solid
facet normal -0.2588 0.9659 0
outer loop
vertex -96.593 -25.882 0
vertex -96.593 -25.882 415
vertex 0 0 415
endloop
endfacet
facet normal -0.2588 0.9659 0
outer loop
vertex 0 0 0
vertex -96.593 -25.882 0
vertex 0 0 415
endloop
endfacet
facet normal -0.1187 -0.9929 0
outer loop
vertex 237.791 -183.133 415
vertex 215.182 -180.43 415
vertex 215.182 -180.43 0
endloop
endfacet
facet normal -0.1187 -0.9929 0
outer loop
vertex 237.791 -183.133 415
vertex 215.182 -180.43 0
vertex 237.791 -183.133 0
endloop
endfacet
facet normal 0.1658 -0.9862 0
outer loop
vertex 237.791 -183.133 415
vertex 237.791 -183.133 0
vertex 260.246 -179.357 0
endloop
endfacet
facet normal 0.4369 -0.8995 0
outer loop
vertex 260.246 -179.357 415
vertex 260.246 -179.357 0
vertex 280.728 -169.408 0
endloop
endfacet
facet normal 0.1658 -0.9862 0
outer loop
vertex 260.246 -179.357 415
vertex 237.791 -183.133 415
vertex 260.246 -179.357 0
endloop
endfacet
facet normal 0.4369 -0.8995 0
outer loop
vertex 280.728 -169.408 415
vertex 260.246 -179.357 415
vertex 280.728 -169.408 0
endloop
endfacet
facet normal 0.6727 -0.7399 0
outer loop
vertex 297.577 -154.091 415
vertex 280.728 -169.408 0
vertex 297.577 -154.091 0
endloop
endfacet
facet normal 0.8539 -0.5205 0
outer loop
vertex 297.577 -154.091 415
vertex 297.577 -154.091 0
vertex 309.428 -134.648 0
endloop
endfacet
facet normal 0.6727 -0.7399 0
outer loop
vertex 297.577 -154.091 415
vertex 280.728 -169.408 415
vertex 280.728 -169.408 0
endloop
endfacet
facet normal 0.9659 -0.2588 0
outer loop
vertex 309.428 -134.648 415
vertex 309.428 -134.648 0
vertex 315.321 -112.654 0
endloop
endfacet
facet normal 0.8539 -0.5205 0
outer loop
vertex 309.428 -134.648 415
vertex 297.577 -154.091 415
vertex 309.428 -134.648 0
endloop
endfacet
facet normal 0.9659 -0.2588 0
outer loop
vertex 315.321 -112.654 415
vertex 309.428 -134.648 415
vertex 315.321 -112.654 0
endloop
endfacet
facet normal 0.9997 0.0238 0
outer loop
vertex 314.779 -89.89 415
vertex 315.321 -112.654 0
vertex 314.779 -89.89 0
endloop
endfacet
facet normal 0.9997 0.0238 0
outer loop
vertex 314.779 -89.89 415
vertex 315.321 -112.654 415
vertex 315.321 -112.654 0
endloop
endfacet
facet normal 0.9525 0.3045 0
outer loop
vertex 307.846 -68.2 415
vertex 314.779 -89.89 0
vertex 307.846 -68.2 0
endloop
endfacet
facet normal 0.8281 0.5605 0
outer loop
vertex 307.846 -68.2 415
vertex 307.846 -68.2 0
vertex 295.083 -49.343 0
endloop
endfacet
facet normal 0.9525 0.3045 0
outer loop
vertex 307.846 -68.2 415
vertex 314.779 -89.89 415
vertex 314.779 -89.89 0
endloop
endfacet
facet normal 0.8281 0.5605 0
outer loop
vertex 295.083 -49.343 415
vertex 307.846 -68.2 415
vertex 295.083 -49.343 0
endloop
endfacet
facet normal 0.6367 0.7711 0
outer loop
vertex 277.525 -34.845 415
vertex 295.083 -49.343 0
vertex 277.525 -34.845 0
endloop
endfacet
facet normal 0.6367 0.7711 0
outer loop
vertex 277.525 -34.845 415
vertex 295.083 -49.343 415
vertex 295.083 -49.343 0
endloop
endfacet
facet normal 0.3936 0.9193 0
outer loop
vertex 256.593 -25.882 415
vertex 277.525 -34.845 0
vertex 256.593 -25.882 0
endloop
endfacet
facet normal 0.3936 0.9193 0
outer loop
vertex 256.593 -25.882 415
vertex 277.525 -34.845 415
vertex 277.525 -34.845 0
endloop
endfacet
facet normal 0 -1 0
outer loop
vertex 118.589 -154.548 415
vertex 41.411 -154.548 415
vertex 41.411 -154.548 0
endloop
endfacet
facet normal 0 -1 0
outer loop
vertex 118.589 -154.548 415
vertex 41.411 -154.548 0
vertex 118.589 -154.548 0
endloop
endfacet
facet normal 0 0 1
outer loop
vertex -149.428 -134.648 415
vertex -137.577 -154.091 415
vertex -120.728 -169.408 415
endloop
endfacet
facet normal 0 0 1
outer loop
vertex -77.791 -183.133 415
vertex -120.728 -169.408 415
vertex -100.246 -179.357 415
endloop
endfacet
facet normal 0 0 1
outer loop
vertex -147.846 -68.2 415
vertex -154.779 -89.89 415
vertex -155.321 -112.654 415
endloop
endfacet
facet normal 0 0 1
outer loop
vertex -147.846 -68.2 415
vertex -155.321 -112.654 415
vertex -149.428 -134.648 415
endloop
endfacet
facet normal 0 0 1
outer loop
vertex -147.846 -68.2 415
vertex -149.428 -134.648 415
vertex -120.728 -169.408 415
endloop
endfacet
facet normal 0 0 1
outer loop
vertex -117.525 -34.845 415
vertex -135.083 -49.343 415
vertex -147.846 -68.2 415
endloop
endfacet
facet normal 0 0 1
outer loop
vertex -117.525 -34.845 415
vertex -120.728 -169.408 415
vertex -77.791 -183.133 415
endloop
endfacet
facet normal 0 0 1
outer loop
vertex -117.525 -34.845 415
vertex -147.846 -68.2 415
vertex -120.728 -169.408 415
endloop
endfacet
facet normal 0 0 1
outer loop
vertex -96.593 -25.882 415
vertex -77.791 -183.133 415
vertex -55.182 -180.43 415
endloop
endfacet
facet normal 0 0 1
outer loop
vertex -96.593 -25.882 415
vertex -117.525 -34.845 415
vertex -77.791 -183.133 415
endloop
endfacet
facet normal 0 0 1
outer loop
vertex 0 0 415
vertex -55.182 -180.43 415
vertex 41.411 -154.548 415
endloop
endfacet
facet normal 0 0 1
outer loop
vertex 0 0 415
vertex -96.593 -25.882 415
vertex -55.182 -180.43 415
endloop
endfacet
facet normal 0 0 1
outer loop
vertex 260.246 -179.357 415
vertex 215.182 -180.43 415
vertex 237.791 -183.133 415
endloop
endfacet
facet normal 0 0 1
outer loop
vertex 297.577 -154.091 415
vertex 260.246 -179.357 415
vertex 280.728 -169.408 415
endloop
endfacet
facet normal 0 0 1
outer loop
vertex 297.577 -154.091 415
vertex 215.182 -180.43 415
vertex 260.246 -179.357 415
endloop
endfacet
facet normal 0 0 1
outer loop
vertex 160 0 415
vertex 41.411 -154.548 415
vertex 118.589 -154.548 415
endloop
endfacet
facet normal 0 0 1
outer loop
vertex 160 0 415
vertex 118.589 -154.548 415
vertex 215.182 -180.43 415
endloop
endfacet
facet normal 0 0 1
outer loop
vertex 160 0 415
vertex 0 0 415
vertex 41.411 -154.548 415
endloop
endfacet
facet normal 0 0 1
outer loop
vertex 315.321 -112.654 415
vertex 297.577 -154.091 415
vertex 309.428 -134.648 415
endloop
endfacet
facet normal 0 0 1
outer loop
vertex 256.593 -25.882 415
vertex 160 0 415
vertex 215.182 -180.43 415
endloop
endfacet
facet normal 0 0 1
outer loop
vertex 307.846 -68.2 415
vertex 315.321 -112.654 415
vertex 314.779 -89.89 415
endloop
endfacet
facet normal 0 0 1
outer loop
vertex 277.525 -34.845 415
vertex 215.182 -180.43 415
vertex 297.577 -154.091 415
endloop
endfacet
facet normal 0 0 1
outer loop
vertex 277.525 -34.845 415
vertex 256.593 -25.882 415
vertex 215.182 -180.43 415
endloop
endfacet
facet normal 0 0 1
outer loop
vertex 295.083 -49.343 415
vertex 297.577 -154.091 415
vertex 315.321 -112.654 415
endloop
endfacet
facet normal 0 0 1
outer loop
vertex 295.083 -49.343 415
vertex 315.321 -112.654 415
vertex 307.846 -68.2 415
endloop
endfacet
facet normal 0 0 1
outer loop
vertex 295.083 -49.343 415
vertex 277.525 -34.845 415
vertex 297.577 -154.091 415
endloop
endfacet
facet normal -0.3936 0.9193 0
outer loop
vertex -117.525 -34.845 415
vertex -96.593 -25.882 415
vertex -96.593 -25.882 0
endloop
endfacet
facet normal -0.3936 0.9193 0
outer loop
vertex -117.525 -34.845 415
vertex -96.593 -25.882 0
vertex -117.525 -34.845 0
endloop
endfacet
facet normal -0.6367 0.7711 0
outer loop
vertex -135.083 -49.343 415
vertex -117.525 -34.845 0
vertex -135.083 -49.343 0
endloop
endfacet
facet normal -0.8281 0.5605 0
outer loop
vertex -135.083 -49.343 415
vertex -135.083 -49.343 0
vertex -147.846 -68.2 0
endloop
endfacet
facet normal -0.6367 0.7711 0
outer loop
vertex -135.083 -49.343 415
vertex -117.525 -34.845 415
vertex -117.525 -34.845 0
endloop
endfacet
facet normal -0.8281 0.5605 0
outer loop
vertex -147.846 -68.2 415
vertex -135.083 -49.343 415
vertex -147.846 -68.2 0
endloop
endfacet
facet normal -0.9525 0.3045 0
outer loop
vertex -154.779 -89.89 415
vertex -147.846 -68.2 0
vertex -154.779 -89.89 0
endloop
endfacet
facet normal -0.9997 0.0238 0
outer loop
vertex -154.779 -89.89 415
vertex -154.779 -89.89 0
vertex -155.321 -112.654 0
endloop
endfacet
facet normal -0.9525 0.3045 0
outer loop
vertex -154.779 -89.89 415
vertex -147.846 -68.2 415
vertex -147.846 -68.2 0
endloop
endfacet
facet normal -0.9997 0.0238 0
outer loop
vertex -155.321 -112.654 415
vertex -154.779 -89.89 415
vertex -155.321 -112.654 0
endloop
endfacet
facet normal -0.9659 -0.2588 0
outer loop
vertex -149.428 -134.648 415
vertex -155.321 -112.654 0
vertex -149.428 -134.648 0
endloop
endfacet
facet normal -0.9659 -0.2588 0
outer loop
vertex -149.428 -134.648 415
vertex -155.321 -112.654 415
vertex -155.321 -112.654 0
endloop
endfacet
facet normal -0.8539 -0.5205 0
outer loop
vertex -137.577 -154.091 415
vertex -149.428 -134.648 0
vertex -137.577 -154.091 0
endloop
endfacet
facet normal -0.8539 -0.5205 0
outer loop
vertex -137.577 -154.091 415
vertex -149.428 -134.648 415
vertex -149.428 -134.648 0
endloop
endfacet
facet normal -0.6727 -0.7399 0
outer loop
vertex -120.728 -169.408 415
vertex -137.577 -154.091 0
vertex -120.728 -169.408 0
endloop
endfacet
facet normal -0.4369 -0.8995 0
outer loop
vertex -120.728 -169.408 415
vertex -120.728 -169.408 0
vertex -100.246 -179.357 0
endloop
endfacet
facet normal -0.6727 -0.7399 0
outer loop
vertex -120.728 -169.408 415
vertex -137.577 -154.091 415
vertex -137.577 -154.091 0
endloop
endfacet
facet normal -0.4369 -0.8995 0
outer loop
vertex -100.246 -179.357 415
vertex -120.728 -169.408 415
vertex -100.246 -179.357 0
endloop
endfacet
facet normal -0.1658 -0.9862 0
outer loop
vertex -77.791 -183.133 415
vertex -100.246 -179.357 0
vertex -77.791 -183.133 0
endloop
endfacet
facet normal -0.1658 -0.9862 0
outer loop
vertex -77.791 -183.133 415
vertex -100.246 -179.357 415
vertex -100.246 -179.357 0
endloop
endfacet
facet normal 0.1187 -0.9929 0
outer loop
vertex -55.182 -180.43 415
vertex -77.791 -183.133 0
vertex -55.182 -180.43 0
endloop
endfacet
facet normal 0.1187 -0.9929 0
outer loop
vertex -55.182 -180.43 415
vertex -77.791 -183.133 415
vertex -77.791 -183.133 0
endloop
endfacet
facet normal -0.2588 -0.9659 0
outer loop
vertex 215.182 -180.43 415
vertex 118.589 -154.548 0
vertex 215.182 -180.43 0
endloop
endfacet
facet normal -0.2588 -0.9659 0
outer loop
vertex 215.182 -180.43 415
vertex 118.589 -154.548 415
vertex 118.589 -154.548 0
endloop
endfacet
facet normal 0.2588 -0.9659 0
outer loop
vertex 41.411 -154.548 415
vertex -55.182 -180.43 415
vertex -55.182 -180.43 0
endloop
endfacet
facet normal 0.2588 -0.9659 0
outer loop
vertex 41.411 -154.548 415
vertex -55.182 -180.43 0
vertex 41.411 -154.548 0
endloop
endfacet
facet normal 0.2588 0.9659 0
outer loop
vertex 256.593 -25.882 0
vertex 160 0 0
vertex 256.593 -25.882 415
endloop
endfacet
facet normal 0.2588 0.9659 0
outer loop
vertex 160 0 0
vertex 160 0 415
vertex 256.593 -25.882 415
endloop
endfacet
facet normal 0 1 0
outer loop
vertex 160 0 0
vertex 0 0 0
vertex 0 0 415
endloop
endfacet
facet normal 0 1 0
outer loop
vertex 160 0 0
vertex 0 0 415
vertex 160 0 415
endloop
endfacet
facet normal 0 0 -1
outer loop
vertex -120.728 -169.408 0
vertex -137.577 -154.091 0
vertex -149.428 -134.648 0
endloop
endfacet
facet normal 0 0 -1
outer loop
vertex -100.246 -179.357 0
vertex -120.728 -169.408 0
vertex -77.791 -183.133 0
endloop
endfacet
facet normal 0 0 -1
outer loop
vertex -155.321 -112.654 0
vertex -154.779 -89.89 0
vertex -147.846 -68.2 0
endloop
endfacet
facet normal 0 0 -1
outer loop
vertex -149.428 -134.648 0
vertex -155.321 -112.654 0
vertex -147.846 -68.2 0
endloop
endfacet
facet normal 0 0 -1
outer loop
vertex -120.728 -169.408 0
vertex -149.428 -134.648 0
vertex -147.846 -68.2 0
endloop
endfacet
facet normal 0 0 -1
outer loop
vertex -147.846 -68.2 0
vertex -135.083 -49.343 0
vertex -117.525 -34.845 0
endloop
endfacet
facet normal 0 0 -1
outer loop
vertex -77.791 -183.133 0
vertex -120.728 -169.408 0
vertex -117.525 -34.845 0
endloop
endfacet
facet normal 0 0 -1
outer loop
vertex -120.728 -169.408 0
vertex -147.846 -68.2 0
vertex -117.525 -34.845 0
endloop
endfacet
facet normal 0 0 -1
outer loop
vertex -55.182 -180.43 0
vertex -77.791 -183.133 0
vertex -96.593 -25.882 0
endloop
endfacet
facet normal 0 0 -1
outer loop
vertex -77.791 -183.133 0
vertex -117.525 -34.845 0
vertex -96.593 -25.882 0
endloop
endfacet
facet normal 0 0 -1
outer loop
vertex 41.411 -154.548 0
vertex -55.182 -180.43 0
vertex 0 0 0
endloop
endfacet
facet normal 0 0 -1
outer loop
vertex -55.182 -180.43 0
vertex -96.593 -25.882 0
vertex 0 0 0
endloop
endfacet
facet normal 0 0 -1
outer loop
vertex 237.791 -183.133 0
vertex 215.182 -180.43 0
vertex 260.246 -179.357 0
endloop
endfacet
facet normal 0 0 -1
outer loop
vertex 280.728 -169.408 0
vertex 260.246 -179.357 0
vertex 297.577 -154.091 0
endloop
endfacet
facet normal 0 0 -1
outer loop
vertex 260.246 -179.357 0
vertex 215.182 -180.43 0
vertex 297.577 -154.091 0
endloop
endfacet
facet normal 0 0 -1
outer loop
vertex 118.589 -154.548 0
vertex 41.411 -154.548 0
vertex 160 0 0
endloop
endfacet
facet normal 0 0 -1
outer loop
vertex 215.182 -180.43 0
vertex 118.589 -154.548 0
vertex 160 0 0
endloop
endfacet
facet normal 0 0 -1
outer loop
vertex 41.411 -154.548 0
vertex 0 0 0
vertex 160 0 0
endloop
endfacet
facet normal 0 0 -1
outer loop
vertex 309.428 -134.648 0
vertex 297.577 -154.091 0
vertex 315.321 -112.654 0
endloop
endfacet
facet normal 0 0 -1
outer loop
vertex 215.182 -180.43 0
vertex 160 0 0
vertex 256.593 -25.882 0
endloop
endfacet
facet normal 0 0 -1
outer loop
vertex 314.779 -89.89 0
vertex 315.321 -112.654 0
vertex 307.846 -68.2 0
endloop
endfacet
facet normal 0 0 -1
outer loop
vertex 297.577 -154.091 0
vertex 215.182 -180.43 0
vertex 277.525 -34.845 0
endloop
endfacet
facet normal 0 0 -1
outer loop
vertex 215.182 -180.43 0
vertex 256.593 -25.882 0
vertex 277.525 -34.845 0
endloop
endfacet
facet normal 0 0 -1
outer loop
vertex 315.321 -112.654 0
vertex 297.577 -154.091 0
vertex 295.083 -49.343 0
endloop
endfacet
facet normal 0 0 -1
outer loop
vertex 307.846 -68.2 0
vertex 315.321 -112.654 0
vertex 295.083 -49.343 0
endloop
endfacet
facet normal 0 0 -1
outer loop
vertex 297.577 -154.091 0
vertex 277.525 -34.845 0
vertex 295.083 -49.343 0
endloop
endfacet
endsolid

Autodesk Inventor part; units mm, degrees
ref_plane "YZ Plane" through (0, 0, 0) normal (1, 0, 0) x (0, 1, 0)
ref_plane "XZ Plane" through (0, 0, 0) normal (0, 1, 0) x (-1, 0, 0)
ref_plane "XY Plane" through (0, 0, 0) normal (0, 0, 1) x (1, 0, 0)
sketch "Sketch1" plane through (0, 0, 0) normal (0, 0, 1) x (1, 0, 0)
  line L0 (0, 0) -> (160, 0)
  line L1 (160, 0) -> (118.589, -154.5481)
  line L2 (0, 0) -> (41.411, -154.5481)
  line L3 (41.411, -154.5481) -> (118.589, -154.5481)
  dimension "d4" = 160
  dimension "d5" = 160
  dimension "d6" = 160
  dimension "d7" = 75
extrude "Extrusion1" add sketch "Sketch1" along normal blind 415
sketch "Sketch2" plane through (0, 0, 415) normal (0, 0, 1) x (1, 0, 0)
  circle A0 centre (235.8871, -103.156) radius 80 construction
  circle A1 centre (-75.8871, -103.156) radius 80 construction
  line L0 (160, 0) -> (0, 0) projected
  line L1 (-96.5926, -25.8819) -> (0, 0)
  line L2 (0, 0) -> (41.411, -154.5481) projected
  line L3 (-55.1815, -180.43) -> (41.411, -154.5481)
  line L4 (0, 0) -> (41.411, -154.5481)
  arc A2 (-96.5926, -25.8819) -> (-55.1815, -180.43) centre (-75.8871, -103.156) ccw
  line L5 (41.411, -154.5481) -> (118.589, -154.5481) projected
  line L6 (118.589, -154.5481) -> (215.1815, -180.43)
  line L7 (160, 0) -> (256.5926, -25.8819)
  arc A3 (215.1815, -180.43) -> (256.5926, -25.8819) centre (235.8871, -103.156) ccw
  line L8 (160, 0) -> (118.589, -154.5481)
  dimension "d8" = 160
  dimension "d9" = 160
  dimension "d10" = 100
  dimension "d13" = 100
extrude "Extrusion2" add sketch "Sketch2" against normal blind 415 contours L7 A3 L6 L8 | L2 L3 A2 L1
properties part number "CA003" material "ABS Plastic"
